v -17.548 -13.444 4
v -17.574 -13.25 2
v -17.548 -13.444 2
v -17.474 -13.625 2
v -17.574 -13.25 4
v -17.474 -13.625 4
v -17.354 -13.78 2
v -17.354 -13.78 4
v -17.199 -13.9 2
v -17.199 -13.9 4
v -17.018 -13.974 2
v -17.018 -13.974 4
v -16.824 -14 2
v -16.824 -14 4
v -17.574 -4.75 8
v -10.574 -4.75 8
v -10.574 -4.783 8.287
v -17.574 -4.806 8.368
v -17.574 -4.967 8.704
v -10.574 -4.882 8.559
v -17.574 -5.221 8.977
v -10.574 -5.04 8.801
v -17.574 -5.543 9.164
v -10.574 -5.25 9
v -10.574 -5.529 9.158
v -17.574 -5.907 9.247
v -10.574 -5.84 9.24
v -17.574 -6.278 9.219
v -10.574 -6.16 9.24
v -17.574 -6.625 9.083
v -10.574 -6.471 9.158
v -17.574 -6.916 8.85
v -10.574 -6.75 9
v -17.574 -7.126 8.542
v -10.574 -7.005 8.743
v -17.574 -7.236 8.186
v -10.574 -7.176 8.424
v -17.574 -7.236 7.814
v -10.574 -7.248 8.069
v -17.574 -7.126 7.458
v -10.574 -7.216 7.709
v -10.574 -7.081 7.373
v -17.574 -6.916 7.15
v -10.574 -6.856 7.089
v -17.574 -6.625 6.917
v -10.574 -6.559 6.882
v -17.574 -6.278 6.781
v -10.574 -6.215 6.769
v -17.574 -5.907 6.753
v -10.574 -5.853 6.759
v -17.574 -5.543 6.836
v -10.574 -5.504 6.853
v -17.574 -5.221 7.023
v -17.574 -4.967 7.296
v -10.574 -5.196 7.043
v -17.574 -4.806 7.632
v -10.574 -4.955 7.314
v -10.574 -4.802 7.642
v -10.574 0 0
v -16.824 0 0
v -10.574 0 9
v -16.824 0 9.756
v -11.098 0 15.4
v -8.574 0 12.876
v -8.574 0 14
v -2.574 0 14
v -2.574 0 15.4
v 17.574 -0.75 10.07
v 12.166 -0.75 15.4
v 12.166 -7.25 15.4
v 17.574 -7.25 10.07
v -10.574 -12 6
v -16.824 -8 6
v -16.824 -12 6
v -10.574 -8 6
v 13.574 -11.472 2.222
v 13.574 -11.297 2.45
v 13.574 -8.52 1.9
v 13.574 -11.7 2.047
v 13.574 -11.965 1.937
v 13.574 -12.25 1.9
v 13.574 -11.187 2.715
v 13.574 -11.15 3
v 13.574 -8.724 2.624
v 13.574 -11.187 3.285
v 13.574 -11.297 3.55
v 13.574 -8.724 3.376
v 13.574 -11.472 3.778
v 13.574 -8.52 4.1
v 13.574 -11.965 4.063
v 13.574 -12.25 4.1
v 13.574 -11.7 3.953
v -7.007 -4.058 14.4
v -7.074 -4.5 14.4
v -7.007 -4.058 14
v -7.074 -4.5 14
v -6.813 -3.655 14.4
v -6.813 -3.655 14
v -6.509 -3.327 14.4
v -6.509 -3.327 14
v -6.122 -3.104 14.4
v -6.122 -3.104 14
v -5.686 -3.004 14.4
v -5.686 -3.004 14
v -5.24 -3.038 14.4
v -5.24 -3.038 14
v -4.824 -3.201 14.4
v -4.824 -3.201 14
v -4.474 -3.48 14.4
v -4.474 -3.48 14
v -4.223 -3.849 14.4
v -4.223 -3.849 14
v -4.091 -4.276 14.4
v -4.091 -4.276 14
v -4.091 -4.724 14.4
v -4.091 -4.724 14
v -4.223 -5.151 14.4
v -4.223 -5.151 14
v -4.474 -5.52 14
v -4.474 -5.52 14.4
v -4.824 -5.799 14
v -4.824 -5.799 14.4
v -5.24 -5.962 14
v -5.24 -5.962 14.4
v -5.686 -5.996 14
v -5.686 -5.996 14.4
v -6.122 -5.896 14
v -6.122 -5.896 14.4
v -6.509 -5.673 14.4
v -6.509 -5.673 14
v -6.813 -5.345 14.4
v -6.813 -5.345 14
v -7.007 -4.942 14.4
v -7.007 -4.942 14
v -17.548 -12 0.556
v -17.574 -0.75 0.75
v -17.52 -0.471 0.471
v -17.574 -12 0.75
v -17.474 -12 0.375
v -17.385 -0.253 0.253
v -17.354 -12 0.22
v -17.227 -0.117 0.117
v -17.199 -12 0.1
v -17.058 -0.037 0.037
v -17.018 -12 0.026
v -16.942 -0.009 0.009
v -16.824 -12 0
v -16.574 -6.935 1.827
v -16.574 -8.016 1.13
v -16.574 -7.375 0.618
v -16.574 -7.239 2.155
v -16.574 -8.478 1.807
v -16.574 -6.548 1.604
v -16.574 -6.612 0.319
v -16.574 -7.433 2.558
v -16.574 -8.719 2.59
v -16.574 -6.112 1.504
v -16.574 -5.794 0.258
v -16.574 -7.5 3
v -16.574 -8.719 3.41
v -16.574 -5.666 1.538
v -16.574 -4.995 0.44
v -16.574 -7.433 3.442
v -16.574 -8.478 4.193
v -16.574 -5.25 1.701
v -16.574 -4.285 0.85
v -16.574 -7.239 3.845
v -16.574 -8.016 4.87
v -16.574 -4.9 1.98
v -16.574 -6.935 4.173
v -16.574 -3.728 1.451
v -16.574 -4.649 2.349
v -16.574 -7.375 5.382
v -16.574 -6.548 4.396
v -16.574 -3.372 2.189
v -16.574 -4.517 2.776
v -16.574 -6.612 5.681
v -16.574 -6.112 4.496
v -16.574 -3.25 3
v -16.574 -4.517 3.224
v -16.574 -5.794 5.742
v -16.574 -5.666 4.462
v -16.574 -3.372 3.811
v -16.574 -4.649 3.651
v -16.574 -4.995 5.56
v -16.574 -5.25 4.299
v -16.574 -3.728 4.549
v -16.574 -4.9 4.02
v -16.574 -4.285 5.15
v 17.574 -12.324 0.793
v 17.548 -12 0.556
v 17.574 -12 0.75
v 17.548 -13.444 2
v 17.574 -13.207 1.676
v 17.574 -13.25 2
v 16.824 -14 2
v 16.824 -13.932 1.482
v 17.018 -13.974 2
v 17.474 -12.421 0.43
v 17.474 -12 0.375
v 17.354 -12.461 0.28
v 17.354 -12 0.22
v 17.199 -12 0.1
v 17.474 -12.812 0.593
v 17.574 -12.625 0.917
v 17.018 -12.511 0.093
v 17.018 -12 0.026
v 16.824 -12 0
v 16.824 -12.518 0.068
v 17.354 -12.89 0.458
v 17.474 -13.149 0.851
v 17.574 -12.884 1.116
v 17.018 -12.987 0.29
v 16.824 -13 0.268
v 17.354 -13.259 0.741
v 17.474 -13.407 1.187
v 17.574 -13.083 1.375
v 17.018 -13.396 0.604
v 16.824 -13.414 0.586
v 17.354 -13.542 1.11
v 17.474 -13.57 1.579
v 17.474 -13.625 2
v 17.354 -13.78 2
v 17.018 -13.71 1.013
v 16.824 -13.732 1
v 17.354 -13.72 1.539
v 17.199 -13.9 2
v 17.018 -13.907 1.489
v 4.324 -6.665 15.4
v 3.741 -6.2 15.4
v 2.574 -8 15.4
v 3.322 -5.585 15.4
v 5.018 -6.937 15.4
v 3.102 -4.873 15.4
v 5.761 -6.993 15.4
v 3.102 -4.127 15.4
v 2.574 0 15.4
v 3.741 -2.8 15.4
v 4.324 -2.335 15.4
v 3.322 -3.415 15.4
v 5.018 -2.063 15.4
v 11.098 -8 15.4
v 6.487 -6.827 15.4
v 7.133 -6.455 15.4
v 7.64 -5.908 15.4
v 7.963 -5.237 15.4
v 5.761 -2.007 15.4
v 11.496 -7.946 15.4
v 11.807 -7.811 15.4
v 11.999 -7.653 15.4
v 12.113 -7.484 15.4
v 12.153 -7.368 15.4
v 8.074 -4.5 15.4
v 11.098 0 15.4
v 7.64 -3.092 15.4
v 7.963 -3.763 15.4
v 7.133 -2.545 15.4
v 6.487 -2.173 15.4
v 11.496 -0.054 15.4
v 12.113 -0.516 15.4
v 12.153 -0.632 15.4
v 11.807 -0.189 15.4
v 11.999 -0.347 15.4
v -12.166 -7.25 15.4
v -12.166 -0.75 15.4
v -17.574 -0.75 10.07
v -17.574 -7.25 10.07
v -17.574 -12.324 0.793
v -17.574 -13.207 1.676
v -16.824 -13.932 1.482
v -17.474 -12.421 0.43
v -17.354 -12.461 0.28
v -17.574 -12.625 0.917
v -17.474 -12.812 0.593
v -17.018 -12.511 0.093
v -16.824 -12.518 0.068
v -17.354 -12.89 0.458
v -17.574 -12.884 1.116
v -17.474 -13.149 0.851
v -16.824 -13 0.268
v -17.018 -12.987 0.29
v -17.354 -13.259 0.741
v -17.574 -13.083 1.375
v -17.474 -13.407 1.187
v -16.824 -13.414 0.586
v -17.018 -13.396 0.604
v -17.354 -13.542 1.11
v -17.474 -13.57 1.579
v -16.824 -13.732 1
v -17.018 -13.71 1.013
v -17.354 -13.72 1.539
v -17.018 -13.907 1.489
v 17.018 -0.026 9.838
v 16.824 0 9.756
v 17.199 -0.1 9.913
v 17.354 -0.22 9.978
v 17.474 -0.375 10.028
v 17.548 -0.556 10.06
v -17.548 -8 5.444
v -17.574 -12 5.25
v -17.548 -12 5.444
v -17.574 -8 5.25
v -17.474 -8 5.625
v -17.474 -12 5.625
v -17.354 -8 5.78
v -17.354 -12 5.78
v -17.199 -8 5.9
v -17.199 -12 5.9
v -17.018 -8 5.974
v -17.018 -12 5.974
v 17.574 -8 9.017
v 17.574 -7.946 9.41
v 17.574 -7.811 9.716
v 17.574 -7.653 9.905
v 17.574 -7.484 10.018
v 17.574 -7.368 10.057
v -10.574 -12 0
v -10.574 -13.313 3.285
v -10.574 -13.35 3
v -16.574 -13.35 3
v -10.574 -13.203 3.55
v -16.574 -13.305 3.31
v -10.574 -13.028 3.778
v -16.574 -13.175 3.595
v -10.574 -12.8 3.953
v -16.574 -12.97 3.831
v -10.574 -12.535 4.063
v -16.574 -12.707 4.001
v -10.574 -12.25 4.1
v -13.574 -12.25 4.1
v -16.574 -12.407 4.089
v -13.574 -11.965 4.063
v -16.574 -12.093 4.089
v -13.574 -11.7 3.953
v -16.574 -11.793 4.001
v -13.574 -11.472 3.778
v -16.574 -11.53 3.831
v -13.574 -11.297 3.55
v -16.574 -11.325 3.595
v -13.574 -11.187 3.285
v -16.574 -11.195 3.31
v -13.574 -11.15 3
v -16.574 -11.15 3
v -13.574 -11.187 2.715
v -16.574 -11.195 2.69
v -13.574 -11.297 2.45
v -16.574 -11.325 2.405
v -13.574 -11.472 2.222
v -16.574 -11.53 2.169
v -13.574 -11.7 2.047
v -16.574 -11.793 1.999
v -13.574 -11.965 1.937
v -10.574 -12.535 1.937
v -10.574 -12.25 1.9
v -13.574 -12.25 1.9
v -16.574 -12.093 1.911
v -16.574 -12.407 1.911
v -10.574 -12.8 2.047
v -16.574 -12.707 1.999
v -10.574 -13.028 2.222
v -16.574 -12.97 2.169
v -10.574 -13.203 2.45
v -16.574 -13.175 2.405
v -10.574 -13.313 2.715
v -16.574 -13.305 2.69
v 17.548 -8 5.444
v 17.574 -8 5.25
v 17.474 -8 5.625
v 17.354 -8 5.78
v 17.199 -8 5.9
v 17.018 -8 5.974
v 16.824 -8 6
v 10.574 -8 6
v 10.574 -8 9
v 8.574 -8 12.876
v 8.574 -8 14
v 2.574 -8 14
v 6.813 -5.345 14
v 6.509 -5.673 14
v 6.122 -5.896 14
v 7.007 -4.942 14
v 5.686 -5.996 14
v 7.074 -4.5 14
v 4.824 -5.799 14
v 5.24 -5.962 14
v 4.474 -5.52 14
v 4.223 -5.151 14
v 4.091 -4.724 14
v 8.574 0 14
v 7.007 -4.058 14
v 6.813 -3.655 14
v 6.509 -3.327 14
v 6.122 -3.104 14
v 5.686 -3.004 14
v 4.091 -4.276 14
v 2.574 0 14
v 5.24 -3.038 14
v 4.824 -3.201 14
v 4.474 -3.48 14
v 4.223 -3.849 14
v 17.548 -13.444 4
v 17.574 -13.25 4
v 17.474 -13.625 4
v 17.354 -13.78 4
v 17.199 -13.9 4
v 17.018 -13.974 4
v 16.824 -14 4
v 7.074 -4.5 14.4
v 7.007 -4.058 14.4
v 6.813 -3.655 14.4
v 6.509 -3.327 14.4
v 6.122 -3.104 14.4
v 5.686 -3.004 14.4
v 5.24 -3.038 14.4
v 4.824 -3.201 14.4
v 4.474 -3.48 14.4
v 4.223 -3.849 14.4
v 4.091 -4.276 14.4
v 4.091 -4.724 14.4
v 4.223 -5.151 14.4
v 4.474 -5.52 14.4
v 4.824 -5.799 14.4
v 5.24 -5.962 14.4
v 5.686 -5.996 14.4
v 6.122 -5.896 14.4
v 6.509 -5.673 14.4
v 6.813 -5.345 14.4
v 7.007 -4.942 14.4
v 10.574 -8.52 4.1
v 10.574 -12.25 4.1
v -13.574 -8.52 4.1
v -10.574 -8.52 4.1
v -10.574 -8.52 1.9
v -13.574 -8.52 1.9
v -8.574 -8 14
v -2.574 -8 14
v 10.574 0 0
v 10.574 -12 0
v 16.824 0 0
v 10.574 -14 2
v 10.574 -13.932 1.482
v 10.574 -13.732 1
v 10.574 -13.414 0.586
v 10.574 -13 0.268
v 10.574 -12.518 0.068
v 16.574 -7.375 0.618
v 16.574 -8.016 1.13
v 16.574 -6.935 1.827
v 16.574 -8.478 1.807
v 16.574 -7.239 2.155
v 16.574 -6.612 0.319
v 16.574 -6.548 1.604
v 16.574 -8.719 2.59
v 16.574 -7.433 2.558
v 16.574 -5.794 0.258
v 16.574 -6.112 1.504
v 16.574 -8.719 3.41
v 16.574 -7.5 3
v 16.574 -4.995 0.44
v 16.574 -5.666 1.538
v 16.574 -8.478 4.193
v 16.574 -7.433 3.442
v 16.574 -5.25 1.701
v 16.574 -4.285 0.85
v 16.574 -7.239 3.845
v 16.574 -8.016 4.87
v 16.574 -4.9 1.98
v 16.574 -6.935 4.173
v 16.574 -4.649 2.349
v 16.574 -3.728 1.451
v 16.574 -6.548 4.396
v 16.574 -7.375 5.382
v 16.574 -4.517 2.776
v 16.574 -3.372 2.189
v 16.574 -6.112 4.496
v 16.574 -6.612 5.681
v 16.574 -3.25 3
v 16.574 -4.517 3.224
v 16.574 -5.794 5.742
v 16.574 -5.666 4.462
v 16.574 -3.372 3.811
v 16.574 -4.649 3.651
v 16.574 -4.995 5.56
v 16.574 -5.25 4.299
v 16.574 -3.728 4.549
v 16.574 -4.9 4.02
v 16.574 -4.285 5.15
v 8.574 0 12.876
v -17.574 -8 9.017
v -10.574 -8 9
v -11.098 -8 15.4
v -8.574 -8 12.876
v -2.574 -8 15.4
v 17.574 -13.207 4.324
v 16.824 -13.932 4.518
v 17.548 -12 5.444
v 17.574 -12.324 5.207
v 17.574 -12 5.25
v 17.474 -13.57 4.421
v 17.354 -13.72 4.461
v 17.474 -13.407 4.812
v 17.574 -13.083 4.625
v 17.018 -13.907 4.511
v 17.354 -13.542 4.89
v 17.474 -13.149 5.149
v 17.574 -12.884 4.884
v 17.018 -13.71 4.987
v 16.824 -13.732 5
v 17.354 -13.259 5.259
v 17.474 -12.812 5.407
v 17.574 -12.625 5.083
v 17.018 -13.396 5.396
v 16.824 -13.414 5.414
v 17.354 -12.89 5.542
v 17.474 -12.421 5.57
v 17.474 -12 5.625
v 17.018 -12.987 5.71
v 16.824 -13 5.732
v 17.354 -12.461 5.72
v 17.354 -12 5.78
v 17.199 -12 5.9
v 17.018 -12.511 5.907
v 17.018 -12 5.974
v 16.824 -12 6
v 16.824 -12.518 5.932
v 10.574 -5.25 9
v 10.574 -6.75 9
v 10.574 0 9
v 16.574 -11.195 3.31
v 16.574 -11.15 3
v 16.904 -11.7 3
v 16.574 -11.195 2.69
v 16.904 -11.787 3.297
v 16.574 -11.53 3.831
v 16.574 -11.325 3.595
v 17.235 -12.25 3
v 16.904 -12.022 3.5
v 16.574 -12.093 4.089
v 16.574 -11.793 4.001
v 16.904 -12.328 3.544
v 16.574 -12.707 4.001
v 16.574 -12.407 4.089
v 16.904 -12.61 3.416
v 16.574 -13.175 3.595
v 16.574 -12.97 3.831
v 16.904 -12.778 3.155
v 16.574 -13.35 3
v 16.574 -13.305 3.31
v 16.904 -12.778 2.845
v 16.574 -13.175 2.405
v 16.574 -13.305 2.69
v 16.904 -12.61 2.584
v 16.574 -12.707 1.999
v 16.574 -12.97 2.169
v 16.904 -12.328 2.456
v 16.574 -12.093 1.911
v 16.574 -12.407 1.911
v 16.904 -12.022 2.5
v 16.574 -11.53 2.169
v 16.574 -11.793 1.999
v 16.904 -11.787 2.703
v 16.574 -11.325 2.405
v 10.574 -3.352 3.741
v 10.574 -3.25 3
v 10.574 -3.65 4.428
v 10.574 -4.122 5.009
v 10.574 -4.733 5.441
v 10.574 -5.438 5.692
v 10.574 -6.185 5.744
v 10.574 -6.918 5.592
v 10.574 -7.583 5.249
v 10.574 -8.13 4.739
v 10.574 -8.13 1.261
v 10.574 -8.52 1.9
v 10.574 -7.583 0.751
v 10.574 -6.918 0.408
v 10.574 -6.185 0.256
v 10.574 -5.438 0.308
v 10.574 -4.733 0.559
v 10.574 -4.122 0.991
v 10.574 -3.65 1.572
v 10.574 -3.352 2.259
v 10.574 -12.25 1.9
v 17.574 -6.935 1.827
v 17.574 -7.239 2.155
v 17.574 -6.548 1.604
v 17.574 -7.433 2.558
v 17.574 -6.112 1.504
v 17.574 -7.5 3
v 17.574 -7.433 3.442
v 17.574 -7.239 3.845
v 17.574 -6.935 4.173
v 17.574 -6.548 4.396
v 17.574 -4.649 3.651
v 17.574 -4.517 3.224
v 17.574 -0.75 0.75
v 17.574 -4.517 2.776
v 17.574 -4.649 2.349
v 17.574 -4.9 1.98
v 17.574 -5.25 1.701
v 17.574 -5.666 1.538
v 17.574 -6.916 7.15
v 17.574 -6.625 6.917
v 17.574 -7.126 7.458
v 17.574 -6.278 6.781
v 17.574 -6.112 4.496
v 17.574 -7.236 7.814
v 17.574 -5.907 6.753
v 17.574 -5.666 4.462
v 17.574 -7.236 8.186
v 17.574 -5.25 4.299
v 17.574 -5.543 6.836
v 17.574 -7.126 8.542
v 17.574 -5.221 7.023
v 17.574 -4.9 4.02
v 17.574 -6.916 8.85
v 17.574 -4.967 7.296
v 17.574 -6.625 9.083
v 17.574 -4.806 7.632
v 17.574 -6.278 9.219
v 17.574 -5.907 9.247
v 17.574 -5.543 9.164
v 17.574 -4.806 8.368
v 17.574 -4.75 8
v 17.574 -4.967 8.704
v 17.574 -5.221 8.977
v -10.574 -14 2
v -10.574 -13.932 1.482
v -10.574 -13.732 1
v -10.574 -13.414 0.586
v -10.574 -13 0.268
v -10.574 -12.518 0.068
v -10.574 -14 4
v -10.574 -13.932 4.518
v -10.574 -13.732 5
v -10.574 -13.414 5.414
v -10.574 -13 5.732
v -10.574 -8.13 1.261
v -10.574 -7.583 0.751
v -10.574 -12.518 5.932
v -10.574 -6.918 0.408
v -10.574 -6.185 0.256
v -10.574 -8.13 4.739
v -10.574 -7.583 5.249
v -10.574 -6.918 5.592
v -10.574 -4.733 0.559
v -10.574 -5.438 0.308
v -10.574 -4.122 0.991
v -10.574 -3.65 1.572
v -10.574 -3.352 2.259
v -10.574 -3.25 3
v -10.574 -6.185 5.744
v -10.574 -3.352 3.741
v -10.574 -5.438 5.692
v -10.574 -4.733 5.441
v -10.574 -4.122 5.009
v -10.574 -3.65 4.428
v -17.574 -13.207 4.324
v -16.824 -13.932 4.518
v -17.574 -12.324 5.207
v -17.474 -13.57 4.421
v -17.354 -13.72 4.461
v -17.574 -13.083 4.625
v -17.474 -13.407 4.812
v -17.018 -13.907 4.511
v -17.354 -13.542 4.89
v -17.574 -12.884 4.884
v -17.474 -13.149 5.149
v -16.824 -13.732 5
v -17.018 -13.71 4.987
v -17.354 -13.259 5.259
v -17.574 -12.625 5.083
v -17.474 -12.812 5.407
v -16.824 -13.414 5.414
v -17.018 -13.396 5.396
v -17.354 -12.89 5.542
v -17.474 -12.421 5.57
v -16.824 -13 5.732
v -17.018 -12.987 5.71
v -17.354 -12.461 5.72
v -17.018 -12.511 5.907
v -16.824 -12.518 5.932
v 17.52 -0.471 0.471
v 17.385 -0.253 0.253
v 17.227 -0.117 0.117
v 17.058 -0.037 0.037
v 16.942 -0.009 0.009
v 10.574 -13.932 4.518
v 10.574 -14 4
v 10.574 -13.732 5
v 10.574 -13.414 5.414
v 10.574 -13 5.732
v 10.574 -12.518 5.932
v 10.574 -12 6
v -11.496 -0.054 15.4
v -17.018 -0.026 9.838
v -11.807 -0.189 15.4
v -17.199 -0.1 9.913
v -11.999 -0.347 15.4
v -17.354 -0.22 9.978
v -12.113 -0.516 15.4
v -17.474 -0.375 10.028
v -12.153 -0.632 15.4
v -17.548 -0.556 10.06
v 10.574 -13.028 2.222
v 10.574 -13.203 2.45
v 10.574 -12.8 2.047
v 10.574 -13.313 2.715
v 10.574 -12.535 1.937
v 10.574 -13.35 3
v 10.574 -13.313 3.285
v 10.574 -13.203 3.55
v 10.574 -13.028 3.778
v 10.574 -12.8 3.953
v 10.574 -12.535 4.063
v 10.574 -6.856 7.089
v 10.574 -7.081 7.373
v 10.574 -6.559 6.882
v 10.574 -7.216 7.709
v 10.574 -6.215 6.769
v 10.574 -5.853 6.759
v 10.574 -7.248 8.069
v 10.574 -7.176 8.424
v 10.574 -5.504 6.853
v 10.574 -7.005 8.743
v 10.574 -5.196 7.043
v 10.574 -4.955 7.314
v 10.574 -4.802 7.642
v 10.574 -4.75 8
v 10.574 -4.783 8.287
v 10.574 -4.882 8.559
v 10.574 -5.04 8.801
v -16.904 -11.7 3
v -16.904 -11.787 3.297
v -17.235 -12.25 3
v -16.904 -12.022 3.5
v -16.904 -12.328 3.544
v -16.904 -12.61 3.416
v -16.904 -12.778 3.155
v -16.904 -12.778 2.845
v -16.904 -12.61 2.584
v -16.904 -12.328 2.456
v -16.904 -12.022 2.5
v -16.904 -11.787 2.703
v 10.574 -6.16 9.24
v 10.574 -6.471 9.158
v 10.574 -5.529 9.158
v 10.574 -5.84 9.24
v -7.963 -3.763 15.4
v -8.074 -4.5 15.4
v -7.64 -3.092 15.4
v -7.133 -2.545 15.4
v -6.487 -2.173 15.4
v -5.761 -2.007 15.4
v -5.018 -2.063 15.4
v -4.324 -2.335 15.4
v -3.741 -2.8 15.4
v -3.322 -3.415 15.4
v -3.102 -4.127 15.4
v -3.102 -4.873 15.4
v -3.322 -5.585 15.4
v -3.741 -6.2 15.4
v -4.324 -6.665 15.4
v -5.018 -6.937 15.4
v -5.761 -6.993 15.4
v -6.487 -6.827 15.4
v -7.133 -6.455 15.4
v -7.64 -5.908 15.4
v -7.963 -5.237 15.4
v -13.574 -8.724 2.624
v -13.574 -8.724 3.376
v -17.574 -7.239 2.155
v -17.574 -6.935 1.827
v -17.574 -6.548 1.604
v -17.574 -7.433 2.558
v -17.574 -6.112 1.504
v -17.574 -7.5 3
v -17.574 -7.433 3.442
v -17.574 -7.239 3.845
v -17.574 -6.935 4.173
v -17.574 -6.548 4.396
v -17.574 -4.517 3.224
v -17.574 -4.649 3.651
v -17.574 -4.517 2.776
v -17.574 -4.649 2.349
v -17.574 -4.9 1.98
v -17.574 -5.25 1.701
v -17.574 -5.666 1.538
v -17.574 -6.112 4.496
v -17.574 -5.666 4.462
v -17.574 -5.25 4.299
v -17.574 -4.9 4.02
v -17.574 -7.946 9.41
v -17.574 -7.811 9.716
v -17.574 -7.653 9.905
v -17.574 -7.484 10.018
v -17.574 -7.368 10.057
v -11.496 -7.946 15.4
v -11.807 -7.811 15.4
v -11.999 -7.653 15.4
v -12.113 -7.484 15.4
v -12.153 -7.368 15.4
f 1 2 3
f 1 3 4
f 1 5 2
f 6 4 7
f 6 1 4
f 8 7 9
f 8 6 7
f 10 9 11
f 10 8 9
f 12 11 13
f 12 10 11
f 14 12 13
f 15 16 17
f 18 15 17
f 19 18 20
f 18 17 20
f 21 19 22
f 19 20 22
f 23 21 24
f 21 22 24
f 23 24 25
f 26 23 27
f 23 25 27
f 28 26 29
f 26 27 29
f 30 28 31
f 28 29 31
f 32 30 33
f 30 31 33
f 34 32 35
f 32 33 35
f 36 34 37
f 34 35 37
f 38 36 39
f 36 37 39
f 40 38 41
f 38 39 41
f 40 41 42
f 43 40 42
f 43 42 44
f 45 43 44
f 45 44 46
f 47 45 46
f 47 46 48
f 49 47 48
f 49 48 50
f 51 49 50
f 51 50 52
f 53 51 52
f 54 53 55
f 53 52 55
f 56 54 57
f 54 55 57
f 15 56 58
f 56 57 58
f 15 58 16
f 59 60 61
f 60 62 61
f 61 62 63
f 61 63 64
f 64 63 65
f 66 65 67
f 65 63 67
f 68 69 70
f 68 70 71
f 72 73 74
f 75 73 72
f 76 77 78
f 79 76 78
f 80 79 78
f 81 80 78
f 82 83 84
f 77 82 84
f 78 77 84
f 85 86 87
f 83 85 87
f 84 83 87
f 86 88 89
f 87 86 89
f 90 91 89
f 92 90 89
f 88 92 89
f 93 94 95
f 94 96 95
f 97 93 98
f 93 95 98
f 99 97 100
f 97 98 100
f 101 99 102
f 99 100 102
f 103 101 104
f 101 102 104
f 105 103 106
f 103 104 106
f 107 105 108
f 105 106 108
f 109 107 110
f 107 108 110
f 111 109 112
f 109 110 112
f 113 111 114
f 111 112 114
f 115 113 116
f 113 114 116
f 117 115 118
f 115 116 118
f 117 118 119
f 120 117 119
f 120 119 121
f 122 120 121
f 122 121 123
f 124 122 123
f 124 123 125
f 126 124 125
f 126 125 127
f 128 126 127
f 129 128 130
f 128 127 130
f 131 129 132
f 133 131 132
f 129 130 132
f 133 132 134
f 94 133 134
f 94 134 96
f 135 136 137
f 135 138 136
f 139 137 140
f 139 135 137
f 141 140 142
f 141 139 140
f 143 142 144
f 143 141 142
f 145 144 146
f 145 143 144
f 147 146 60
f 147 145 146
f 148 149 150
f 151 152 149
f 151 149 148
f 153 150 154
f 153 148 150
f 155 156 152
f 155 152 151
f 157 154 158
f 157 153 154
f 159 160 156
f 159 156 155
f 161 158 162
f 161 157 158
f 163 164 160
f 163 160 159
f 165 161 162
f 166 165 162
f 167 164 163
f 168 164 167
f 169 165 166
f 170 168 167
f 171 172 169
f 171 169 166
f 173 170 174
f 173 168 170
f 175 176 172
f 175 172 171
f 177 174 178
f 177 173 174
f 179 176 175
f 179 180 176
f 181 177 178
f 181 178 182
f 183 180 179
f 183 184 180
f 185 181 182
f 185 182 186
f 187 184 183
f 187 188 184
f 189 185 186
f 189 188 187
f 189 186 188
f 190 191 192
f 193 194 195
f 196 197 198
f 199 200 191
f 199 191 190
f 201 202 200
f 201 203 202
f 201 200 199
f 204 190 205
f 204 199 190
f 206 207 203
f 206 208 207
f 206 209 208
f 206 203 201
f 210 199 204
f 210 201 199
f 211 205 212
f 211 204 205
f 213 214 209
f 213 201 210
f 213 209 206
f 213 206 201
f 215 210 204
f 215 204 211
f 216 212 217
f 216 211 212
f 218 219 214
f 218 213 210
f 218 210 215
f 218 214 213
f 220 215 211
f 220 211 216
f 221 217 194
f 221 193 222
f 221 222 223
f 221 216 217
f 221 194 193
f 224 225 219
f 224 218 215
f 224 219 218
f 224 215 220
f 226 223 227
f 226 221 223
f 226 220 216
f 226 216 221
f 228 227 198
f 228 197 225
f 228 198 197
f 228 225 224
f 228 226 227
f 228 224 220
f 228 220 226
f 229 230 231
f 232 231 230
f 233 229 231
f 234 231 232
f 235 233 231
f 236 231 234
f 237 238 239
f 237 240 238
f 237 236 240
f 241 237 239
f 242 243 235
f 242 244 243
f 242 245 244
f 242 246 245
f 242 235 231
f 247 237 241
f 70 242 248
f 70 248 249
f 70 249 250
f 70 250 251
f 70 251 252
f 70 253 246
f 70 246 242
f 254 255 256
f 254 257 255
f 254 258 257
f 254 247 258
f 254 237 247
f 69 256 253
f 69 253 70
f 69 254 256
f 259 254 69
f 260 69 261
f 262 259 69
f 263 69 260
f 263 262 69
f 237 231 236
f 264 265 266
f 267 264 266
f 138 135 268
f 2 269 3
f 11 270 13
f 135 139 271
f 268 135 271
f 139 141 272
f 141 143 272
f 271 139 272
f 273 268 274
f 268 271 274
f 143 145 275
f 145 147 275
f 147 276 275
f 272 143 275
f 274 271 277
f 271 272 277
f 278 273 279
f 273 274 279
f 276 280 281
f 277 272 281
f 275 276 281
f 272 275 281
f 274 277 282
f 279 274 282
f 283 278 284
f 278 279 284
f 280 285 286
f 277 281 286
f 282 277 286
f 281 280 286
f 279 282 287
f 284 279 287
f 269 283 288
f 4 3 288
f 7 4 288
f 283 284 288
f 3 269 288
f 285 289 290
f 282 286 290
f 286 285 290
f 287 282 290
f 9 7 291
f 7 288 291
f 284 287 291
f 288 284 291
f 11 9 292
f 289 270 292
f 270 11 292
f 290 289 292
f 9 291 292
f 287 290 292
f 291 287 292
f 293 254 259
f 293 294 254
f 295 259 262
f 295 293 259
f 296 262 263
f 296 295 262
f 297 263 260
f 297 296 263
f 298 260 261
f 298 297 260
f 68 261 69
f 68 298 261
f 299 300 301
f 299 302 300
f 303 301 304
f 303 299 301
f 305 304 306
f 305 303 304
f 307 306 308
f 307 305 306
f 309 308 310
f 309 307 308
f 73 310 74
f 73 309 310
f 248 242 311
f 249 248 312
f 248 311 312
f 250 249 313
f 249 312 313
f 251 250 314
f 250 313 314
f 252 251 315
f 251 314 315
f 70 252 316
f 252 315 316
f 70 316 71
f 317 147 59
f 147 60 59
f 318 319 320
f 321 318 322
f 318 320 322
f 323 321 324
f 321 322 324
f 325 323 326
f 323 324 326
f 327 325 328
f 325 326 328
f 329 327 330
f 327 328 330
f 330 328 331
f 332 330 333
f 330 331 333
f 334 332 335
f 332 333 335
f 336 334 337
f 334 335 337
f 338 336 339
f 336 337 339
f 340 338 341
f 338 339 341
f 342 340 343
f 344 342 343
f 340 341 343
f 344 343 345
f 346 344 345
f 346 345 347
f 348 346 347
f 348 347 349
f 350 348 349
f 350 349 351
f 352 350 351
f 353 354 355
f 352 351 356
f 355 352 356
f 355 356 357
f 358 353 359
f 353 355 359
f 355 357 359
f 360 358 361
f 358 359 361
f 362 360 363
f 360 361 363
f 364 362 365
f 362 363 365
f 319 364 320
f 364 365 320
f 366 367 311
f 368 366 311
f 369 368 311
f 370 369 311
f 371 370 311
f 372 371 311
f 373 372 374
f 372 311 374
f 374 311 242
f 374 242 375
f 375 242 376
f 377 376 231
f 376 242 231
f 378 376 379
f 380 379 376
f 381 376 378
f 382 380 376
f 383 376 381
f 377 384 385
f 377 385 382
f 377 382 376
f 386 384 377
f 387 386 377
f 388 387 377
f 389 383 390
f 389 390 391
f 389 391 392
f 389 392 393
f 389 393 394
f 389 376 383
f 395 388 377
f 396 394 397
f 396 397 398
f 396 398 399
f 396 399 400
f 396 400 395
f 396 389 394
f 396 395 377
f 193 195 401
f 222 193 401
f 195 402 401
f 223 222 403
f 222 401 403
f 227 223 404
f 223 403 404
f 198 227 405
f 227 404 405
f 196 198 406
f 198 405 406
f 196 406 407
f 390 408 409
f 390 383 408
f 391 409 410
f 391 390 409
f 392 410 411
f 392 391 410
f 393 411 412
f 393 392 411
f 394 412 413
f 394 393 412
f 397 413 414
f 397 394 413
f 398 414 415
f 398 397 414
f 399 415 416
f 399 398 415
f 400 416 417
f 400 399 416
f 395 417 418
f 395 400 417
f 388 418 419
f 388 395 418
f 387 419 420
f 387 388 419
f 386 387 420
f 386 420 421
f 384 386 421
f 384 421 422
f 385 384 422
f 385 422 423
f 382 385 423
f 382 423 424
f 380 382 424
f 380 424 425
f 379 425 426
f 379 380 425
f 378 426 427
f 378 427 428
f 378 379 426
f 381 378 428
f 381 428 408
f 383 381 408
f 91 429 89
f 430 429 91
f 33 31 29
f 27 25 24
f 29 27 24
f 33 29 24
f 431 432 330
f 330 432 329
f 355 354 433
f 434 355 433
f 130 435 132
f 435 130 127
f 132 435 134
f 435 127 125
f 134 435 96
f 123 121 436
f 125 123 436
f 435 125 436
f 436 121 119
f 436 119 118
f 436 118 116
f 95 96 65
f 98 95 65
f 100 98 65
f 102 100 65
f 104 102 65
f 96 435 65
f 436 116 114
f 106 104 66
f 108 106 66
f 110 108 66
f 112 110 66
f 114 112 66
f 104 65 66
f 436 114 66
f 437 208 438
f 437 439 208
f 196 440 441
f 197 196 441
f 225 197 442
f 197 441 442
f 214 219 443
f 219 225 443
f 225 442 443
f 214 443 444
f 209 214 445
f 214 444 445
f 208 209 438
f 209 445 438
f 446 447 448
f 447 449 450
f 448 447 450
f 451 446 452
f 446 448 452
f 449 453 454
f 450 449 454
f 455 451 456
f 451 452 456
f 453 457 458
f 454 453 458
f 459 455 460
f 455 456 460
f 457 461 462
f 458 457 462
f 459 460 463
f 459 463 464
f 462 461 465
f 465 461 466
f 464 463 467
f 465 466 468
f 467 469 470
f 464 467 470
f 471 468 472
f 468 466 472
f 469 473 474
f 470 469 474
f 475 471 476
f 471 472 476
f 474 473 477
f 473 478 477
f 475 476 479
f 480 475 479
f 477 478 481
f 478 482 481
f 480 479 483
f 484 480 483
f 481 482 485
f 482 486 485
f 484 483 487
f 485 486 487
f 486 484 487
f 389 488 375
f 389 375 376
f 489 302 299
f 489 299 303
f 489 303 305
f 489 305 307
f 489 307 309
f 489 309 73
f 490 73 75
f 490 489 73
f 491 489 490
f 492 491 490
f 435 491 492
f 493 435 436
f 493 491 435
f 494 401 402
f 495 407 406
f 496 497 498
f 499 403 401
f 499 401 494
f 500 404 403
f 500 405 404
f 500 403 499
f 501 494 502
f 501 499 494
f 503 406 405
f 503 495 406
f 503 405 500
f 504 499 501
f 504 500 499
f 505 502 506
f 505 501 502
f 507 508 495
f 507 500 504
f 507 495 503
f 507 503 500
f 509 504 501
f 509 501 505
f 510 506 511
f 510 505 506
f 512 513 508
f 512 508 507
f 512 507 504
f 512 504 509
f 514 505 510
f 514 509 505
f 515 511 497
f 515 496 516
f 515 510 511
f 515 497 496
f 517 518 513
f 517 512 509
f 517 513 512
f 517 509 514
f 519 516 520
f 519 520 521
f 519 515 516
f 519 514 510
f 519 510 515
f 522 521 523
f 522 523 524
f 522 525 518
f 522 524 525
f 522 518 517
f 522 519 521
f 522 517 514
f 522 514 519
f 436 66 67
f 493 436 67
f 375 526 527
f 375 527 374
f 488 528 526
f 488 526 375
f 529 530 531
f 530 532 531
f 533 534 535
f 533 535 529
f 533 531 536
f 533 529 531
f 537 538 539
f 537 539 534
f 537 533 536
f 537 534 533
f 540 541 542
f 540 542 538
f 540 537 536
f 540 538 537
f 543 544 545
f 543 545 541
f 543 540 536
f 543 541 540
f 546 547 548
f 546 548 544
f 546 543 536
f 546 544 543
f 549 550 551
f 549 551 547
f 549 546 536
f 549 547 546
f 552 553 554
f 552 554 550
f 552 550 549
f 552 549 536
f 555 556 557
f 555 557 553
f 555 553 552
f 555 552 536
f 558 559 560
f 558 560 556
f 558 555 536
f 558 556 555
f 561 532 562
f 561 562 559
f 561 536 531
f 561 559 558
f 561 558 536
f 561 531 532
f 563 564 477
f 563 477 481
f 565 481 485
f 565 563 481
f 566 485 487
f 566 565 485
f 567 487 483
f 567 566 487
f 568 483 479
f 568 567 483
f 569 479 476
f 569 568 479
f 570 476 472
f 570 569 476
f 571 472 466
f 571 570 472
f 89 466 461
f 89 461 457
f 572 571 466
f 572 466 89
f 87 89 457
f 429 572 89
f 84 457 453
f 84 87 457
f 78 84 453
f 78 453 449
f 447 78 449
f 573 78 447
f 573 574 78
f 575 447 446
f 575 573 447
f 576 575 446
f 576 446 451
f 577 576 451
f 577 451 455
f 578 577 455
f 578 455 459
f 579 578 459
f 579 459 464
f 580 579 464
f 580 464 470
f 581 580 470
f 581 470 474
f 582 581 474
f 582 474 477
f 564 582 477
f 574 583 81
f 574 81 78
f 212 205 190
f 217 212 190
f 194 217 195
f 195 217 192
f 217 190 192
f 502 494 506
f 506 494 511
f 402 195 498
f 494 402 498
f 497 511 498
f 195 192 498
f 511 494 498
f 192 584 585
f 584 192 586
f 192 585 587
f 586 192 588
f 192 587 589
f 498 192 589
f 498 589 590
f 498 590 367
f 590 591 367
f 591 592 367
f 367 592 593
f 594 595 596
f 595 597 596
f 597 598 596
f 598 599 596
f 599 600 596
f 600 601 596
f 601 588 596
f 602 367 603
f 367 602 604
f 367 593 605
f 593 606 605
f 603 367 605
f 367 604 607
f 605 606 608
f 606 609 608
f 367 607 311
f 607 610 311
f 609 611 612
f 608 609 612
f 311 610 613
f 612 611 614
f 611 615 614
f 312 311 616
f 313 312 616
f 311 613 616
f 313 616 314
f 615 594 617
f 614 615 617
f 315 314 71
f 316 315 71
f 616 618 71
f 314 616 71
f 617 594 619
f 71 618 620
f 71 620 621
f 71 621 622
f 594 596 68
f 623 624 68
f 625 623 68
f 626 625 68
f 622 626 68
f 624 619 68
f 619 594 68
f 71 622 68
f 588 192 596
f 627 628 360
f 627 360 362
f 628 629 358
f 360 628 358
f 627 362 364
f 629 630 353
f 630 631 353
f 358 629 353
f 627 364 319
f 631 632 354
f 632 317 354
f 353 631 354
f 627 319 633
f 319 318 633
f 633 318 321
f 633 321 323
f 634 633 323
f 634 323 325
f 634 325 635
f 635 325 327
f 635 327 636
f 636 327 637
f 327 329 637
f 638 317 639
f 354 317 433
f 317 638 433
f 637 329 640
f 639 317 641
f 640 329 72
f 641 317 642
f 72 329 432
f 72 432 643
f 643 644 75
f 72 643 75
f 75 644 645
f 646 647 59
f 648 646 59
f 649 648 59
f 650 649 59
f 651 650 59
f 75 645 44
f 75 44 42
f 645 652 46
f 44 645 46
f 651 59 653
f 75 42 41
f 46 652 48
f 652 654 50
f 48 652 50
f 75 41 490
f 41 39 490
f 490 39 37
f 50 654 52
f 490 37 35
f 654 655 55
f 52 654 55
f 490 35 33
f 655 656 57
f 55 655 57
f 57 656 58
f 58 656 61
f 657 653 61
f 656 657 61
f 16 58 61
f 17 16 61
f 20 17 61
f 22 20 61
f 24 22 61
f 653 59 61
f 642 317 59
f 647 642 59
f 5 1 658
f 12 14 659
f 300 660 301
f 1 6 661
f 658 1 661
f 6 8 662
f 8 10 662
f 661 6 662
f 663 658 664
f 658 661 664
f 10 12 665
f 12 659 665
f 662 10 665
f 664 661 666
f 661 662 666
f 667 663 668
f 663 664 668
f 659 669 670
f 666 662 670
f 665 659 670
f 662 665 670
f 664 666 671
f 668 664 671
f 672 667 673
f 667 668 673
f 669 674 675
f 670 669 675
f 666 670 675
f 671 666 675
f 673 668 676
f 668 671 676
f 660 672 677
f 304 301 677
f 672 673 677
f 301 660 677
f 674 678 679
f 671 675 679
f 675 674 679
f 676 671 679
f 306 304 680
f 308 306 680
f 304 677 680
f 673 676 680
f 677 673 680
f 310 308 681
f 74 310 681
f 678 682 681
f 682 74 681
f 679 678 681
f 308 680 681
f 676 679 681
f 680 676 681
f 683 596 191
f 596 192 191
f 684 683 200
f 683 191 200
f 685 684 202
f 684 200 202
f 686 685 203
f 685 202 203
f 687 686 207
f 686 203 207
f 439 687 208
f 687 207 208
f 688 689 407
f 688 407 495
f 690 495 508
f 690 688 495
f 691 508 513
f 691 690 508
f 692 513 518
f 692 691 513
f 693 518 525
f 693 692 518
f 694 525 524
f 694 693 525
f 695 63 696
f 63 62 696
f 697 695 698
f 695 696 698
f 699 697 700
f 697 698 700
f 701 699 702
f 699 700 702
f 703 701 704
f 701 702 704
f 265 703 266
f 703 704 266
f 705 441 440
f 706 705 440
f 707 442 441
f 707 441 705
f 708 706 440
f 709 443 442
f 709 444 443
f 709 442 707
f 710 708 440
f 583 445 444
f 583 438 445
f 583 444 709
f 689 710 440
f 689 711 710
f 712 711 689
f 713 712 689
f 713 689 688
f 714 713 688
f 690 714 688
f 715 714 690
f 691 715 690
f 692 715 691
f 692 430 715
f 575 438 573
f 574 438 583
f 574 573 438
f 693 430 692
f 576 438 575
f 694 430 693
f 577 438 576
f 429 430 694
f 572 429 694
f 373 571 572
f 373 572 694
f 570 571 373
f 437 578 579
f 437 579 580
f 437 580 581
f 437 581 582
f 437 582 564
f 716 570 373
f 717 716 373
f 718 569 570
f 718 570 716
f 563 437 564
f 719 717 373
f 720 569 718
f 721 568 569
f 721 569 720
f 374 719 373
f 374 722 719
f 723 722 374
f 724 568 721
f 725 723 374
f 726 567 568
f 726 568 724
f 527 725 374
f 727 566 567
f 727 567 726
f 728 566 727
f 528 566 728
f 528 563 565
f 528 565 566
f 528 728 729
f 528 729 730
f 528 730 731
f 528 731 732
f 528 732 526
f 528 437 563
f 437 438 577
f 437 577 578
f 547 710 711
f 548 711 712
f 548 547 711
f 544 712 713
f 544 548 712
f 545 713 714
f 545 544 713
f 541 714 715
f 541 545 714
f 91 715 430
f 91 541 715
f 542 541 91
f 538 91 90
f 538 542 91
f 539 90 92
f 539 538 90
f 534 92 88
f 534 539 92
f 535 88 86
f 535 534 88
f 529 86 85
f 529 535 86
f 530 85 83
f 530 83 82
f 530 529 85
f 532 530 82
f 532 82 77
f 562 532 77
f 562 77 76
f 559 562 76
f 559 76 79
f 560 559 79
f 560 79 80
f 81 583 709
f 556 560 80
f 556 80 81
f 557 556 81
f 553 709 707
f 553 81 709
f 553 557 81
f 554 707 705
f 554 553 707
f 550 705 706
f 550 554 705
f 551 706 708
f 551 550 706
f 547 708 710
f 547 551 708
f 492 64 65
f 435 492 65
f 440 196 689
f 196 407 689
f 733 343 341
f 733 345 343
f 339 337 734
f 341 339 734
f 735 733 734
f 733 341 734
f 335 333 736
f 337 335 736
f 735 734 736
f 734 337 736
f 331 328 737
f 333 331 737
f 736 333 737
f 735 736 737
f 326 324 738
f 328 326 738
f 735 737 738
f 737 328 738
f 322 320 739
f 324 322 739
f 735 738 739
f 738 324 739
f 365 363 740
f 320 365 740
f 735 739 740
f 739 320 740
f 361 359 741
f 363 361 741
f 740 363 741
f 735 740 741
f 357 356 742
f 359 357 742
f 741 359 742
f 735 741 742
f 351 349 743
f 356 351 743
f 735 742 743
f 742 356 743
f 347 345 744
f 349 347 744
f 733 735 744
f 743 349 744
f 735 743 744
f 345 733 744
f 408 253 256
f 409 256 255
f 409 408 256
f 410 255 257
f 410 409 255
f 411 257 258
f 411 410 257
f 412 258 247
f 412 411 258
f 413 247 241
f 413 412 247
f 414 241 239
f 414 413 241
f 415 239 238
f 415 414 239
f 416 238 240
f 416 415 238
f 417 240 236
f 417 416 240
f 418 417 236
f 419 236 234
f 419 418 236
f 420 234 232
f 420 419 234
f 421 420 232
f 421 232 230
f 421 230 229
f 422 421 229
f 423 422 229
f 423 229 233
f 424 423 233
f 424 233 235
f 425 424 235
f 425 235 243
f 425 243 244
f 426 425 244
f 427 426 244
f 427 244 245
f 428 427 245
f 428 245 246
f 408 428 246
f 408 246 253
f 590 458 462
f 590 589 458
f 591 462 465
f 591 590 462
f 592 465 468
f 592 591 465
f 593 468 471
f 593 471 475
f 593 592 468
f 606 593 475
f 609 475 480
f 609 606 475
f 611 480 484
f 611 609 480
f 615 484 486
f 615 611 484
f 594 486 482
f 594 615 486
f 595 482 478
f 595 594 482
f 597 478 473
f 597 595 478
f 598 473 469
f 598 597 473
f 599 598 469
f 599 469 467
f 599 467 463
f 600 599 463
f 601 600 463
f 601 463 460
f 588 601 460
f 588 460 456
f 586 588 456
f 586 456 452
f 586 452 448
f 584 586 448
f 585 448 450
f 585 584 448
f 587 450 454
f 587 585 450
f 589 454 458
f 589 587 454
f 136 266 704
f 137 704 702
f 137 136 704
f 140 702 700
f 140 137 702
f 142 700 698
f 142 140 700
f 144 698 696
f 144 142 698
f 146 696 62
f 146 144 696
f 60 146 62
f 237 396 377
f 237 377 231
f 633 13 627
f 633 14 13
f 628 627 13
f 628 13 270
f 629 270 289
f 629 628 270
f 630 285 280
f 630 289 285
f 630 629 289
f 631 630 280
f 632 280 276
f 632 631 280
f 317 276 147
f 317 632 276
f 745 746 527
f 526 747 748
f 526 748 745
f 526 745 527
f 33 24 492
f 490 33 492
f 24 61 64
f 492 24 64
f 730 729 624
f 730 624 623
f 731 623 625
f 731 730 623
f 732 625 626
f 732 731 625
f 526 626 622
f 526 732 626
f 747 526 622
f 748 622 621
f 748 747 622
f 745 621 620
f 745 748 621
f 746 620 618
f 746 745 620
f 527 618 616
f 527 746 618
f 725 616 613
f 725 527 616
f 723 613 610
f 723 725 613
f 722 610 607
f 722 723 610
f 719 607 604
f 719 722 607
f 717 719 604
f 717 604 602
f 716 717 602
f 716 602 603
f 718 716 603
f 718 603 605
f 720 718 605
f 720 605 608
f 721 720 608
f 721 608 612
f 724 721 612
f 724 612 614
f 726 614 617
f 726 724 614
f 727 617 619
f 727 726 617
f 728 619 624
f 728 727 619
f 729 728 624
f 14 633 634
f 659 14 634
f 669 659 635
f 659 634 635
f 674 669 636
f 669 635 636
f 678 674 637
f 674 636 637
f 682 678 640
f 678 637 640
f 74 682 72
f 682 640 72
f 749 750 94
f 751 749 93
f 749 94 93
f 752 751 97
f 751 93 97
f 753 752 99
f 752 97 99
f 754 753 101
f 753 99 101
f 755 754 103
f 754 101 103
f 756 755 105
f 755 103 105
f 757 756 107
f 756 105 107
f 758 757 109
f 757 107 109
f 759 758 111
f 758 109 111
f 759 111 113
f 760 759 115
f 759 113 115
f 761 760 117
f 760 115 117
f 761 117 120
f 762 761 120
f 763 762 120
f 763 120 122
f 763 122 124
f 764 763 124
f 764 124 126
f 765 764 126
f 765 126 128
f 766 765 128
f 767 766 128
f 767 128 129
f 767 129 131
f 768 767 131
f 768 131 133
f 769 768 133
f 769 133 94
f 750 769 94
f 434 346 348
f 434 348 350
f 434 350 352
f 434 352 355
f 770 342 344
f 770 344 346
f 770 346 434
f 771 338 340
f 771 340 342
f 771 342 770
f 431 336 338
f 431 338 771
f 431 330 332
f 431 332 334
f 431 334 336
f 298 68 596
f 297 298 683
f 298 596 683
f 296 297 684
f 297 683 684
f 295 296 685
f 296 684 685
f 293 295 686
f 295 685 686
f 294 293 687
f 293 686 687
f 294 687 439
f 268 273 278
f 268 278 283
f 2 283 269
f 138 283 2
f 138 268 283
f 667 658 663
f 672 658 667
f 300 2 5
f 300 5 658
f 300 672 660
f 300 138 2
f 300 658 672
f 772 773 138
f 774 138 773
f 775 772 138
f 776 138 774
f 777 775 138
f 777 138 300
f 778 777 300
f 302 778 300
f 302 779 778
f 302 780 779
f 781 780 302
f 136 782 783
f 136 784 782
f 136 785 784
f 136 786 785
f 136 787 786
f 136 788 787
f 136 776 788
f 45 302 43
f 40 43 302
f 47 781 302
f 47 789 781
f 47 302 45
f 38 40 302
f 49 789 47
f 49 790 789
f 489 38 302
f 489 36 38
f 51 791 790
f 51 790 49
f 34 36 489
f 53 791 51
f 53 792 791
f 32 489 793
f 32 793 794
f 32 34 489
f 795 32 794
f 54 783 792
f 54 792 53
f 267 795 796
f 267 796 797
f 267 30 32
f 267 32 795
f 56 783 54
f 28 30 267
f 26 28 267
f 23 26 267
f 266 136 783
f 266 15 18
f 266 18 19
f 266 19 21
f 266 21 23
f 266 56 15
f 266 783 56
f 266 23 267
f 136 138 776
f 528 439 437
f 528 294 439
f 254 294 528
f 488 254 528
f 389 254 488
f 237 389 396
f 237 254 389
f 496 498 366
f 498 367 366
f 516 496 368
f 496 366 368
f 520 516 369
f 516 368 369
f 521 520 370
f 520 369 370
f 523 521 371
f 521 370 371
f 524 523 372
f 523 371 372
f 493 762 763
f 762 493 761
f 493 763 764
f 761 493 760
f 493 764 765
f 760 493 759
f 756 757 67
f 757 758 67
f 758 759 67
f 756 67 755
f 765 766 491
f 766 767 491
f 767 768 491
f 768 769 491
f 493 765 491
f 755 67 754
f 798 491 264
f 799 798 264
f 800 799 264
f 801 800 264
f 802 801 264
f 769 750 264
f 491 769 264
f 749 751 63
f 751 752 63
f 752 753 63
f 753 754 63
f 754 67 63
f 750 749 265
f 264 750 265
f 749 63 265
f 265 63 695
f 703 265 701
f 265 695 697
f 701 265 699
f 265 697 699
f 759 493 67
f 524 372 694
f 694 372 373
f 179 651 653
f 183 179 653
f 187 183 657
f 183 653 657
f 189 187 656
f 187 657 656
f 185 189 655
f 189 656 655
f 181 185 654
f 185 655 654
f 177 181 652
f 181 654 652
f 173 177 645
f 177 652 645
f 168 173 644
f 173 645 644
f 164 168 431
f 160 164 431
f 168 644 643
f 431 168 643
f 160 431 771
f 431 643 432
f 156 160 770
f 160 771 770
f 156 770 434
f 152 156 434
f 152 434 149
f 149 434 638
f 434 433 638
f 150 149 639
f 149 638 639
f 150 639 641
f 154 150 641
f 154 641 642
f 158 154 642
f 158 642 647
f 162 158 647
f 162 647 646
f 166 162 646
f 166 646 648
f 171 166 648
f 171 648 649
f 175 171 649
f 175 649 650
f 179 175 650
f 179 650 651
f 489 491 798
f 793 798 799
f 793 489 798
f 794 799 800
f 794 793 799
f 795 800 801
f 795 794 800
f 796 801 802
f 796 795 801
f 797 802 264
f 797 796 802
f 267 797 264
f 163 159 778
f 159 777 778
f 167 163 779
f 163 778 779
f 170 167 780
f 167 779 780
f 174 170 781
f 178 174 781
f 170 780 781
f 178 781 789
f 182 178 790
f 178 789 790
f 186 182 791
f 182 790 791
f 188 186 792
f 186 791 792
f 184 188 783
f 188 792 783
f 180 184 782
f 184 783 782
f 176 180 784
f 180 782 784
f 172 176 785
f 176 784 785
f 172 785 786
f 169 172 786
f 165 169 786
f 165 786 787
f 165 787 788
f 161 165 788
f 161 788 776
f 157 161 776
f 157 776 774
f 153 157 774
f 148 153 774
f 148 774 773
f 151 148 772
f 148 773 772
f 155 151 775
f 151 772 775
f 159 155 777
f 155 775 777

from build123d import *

# Parameters (mm, degrees)
F1_DEPTH       = 8
F3_D           = 3
F3_CSINK_D     = 5
F3_CSINK_ANGLE = 90
F5_W           = 7
F5_H           = 6
F6_DEPTH       = 6
F7_D           = 3
F7_CBORE_D     = 5.5
F7_CBORE_DEPTH = 6
F8_DEPTH       = 3
F9_D           = 2.2
F9_DEPTH       = 6
F9_TIP         = 0.6609466809
F10_R          = 2
F11_R          = 0.75
F12_D          = 2.5
F12_DEPTH      = 7.001


with BuildPart() as f1:
    # F0 (on Front) → F1 (new body)
    with BuildSketch(Plane.XZ):
        Polygon((-17.5740234554, 0), (-10.5740234554, 0), (-10.5740234554, 9), (-8.5740234554, 12.8761678934), (-8.5740234554, 14), (-2.5740234554, 14), (-2.5740234554, 15.4), (-12.1664005704, 15.4), (-17.5740234554, 10.0703090429), align=None)
    extrude(amount=F1_DEPTH)

    # F3 (through all)
    with Locations(Plane.XY.offset(15.4)):
        with Locations((-5.5740234554, -4.5)):
            CounterSinkHole(F3_D / 2, F3_CSINK_D / 2, counter_sink_angle=F3_CSINK_ANGLE)

    # F5 (on face) → F6 (join)
    with BuildSketch(Plane.XZ.offset(8)):
        with Locations((-14.0740234554, 3)):
            Rectangle(F5_W, F5_H)
    extrude(amount=F6_DEPTH)

    # F7 (through all)
    with Locations(Plane.YZ.offset(-10.5740234554)):
        with Locations((-6, 3)):
            CounterBoreHole(F7_D / 2, F7_CBORE_D / 2, F7_CBORE_DEPTH)

    # F4 (on face) → F8 (cut)
    with BuildSketch(Plane.YZ.offset(-10.5740234554)):
        with BuildLine():
            Line((-11.15, 3), (-8, 3))
            Line((-8, 3), (-8, 4.1))
            Line((-8, 4.1), (-12.25, 4.1))
            ThreePointArc((-12.25, 4.1), (-11.4721825407, 3.7778174593), (-11.15, 3))
        make_face()
        with BuildLine():
            Line((-8, 1.9), (-8, 3))
            Line((-8, 3), (-11.15, 3))
            ThreePointArc((-11.15, 3), (-11.4721825407, 2.2221825407), (-12.25, 1.9))
            Line((-12.25, 1.9), (-8, 1.9))
        make_face()
    extrude(amount=-F8_DEPTH, mode=Mode.SUBTRACT)

    # F9
    with Locations(Plane.YZ.offset(-10.5740234554)):
        with Locations((-12.25, 3)):
            Hole(F9_D / 2, depth=F9_DEPTH)
            with Locations((0, 0, -(F9_DEPTH + F9_TIP / 2))):  # 118° drill point
                Cone(0, F9_D / 2, F9_TIP, mode=Mode.SUBTRACT)

    # F10
    f10_edges = [f1.edges().sort_by_distance(p)[0] for p in [
        (-14.074023, -14, 6),
        (-14.074023, -14, 0),
    ]]
    fillet(f10_edges, radius=F10_R)

    # F11
    f11_edges = [f1.edges().sort_by_distance(p)[0] for p in [
        (-14.870212, 0, 12.735155),
        (-14.870212, -8, 12.735155),
        (-17.574023, 0, 5.035155),
        (-17.574023, -6, 0),
    ]]
    fillet(f11_edges, radius=F11_R)

    # F12 (through all, one way)
    with BuildSketch(Plane.YZ.offset(-10.5740234554)):
        with Locations((-6, 8)):
            Circle(F12_D / 2)
    extrude(amount=-F12_DEPTH, mode=Mode.SUBTRACT)


with BuildPart() as f13_1:
    # F13: instance of F1
    add(f1.part.mirror(Plane.YZ))


solid = Compound([f1.part, f13_1.part])
